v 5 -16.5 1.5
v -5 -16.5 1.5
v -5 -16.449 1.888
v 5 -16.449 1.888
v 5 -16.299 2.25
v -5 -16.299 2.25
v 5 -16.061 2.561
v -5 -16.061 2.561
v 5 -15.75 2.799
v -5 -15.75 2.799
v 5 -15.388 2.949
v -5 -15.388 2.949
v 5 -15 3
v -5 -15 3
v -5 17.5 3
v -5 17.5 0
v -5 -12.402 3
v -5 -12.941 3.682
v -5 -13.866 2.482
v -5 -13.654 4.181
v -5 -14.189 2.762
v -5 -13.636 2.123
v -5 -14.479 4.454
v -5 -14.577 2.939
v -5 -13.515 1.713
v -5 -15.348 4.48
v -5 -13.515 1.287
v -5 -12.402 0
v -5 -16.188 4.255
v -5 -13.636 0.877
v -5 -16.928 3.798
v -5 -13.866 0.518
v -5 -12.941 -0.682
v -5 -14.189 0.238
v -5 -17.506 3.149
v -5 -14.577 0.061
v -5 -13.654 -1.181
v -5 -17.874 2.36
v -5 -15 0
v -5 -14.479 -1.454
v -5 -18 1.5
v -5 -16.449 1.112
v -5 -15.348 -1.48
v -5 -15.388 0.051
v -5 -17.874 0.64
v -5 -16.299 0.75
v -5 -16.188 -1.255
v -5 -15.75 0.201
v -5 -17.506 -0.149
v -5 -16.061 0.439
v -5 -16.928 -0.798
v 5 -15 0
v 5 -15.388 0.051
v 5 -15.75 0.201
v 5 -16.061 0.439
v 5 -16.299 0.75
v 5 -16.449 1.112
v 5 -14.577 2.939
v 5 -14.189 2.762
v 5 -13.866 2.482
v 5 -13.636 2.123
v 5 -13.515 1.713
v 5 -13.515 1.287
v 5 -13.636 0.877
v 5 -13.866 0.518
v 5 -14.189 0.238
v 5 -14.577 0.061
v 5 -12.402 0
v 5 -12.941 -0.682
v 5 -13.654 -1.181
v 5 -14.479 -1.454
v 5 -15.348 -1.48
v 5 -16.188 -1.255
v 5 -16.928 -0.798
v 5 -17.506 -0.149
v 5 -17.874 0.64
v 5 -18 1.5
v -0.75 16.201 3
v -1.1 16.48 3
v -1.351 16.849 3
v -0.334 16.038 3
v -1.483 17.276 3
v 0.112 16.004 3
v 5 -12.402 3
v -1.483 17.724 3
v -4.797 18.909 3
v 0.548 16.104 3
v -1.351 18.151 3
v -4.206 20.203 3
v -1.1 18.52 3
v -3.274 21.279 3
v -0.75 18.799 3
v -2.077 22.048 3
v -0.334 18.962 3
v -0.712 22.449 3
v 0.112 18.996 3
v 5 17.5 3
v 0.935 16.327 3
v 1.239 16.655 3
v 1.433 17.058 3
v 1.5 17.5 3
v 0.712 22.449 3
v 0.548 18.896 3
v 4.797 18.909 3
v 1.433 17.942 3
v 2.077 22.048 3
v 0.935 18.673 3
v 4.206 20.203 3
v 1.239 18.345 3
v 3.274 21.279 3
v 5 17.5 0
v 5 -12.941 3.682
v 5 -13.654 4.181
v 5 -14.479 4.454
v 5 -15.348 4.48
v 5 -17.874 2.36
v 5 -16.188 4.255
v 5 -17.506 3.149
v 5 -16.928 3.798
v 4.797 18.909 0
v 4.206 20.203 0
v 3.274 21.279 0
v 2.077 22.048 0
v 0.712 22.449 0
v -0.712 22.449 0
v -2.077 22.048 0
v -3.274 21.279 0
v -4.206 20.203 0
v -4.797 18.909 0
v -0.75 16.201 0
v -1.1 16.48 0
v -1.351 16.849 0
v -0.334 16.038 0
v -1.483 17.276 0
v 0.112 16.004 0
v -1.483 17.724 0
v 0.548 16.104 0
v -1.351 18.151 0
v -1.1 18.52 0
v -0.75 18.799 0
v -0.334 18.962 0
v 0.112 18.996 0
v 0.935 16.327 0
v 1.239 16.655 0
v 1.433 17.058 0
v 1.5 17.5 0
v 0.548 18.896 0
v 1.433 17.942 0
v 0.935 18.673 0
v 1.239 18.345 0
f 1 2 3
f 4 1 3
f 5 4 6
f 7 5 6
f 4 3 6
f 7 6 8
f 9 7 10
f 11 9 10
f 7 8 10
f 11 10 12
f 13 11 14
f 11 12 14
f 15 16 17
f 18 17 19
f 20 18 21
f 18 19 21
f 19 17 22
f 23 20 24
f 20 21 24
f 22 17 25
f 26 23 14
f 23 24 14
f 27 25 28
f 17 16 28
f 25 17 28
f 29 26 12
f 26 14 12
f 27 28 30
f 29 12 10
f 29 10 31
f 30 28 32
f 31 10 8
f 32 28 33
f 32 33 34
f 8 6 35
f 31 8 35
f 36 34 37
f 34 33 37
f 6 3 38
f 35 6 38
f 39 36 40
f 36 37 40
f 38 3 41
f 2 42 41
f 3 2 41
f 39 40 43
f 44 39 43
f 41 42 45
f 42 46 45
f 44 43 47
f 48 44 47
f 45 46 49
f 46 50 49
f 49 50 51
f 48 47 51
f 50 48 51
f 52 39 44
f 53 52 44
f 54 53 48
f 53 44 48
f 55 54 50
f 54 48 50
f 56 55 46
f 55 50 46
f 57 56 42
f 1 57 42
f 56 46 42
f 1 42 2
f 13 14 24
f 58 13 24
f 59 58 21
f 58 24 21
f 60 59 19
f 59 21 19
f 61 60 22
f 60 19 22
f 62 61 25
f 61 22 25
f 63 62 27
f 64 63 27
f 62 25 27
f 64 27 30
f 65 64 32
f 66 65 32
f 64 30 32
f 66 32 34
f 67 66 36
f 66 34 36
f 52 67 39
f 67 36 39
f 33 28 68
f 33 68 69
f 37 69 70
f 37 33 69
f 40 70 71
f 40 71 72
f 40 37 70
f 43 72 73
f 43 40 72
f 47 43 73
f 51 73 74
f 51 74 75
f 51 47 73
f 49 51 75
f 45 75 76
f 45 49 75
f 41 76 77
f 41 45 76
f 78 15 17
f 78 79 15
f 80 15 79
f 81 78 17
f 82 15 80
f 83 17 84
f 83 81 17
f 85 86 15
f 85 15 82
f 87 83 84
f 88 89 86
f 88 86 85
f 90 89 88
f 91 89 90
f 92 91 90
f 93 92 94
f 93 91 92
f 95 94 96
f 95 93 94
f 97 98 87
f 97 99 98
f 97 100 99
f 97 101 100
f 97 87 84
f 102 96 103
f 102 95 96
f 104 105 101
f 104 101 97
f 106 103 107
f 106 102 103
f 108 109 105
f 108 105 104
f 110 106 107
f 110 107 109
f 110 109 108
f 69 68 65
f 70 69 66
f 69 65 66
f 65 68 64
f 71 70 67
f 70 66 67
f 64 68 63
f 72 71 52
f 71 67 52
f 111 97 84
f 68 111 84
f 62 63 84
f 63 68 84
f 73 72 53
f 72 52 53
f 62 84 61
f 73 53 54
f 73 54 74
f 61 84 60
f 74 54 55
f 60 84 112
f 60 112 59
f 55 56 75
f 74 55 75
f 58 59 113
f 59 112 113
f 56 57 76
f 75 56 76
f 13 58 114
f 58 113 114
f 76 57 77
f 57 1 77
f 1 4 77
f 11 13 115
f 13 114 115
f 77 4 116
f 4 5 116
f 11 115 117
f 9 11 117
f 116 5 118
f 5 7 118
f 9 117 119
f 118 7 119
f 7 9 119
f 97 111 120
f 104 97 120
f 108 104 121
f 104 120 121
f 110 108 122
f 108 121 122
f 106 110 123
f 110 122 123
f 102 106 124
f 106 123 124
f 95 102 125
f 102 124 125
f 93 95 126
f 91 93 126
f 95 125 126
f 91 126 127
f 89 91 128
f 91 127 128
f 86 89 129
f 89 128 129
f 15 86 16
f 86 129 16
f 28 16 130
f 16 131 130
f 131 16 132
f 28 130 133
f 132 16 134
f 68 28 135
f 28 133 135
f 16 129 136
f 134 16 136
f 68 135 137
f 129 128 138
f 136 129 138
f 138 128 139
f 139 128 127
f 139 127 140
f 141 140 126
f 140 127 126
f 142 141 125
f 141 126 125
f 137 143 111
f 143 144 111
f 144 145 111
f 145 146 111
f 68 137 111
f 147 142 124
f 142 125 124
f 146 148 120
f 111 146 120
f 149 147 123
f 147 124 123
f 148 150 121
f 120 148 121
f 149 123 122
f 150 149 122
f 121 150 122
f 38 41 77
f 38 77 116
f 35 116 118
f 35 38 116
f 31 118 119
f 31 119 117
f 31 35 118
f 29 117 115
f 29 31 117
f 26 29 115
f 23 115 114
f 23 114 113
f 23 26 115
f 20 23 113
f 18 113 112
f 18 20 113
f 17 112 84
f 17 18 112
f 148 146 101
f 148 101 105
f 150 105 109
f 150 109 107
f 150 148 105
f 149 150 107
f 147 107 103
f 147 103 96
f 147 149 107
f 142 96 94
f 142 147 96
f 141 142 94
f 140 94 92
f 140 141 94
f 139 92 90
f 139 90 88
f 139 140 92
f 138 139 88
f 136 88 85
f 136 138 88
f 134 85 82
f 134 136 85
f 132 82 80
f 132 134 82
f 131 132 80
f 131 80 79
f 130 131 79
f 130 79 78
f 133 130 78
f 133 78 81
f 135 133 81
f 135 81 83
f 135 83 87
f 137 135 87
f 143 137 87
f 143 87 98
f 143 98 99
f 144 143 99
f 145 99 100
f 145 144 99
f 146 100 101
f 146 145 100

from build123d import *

# Parameters (mm, degrees)
F0_R     = 1.5
F1_DEPTH = 3
F3_DEPTH = 10
F4_DEPTH = 10.001


with BuildPart() as f1:
    # F0 (on Top) → F1 (new body)
    with BuildSketch(Plane.XY):
        with BuildLine():
            Line((-5, -17.5), (5, -17.5))
            Line((5, -17.5), (5, 17.5))
            ThreePointArc((5, 17.5), (0, 22.5), (-5, 17.5))
            Line((-5, 17.5), (-5, -17.5))
        make_face()
        with Locations((0, 17.5)):
            Circle(F0_R, mode=Mode.SUBTRACT)
    extrude(amount=F1_DEPTH)

    # F2 (on face) → F3 (join, through all)
    with BuildSketch(Plane(origin=(-5, 0, 0), x_dir=(0, -1, 0), z_dir=(-1, 0, 0))):
        with BuildLine():
            ThreePointArc((15, 3), (16.0606601718, 2.5606601718), (16.5, 1.5))
            ThreePointArc((16.5, 1.5), (16.0606601718, 0.4393398282), (15, 0))
            Line((15, 0), (17.5, 0))
            Line((17.5, 0), (17.5, 3))
            Line((17.5, 3), (15, 3))
        make_face()
        with BuildLine():
            Line((12.4019237886, 3), (15, 3))
            Line((15, 3), (17.5, 3))
            Line((17.5, 3), (17.5, 0))
            Line((17.5, 0), (15, 0))
            Line((15, 0), (12.4019237886, 0))
            ThreePointArc((12.4019237886, 0), (15.7764571353, -1.3977774789), (18, 1.5))
            ThreePointArc((18, 1.5), (15.7764571353, 4.3977774789), (12.4019237886, 3))
        make_face()
    extrude(amount=-F3_DEPTH)

    # F2 (on face) → F4 (cut, through all)
    with BuildSketch(Plane(origin=(-5, 0, 0), x_dir=(0, -1, 0), z_dir=(-1, 0, 0))):
        with BuildLine():
            ThreePointArc((15, 0), (16.0606601718, 0.4393398282), (16.5, 1.5))
            ThreePointArc((16.5, 1.5), (16.0606601718, 2.5606601718), (15, 3))
            ThreePointArc((15, 3), (13.5, 1.5), (15, 0))
        make_face()
    extrude(amount=-F4_DEPTH, mode=Mode.SUBTRACT)


solid = f1.part
